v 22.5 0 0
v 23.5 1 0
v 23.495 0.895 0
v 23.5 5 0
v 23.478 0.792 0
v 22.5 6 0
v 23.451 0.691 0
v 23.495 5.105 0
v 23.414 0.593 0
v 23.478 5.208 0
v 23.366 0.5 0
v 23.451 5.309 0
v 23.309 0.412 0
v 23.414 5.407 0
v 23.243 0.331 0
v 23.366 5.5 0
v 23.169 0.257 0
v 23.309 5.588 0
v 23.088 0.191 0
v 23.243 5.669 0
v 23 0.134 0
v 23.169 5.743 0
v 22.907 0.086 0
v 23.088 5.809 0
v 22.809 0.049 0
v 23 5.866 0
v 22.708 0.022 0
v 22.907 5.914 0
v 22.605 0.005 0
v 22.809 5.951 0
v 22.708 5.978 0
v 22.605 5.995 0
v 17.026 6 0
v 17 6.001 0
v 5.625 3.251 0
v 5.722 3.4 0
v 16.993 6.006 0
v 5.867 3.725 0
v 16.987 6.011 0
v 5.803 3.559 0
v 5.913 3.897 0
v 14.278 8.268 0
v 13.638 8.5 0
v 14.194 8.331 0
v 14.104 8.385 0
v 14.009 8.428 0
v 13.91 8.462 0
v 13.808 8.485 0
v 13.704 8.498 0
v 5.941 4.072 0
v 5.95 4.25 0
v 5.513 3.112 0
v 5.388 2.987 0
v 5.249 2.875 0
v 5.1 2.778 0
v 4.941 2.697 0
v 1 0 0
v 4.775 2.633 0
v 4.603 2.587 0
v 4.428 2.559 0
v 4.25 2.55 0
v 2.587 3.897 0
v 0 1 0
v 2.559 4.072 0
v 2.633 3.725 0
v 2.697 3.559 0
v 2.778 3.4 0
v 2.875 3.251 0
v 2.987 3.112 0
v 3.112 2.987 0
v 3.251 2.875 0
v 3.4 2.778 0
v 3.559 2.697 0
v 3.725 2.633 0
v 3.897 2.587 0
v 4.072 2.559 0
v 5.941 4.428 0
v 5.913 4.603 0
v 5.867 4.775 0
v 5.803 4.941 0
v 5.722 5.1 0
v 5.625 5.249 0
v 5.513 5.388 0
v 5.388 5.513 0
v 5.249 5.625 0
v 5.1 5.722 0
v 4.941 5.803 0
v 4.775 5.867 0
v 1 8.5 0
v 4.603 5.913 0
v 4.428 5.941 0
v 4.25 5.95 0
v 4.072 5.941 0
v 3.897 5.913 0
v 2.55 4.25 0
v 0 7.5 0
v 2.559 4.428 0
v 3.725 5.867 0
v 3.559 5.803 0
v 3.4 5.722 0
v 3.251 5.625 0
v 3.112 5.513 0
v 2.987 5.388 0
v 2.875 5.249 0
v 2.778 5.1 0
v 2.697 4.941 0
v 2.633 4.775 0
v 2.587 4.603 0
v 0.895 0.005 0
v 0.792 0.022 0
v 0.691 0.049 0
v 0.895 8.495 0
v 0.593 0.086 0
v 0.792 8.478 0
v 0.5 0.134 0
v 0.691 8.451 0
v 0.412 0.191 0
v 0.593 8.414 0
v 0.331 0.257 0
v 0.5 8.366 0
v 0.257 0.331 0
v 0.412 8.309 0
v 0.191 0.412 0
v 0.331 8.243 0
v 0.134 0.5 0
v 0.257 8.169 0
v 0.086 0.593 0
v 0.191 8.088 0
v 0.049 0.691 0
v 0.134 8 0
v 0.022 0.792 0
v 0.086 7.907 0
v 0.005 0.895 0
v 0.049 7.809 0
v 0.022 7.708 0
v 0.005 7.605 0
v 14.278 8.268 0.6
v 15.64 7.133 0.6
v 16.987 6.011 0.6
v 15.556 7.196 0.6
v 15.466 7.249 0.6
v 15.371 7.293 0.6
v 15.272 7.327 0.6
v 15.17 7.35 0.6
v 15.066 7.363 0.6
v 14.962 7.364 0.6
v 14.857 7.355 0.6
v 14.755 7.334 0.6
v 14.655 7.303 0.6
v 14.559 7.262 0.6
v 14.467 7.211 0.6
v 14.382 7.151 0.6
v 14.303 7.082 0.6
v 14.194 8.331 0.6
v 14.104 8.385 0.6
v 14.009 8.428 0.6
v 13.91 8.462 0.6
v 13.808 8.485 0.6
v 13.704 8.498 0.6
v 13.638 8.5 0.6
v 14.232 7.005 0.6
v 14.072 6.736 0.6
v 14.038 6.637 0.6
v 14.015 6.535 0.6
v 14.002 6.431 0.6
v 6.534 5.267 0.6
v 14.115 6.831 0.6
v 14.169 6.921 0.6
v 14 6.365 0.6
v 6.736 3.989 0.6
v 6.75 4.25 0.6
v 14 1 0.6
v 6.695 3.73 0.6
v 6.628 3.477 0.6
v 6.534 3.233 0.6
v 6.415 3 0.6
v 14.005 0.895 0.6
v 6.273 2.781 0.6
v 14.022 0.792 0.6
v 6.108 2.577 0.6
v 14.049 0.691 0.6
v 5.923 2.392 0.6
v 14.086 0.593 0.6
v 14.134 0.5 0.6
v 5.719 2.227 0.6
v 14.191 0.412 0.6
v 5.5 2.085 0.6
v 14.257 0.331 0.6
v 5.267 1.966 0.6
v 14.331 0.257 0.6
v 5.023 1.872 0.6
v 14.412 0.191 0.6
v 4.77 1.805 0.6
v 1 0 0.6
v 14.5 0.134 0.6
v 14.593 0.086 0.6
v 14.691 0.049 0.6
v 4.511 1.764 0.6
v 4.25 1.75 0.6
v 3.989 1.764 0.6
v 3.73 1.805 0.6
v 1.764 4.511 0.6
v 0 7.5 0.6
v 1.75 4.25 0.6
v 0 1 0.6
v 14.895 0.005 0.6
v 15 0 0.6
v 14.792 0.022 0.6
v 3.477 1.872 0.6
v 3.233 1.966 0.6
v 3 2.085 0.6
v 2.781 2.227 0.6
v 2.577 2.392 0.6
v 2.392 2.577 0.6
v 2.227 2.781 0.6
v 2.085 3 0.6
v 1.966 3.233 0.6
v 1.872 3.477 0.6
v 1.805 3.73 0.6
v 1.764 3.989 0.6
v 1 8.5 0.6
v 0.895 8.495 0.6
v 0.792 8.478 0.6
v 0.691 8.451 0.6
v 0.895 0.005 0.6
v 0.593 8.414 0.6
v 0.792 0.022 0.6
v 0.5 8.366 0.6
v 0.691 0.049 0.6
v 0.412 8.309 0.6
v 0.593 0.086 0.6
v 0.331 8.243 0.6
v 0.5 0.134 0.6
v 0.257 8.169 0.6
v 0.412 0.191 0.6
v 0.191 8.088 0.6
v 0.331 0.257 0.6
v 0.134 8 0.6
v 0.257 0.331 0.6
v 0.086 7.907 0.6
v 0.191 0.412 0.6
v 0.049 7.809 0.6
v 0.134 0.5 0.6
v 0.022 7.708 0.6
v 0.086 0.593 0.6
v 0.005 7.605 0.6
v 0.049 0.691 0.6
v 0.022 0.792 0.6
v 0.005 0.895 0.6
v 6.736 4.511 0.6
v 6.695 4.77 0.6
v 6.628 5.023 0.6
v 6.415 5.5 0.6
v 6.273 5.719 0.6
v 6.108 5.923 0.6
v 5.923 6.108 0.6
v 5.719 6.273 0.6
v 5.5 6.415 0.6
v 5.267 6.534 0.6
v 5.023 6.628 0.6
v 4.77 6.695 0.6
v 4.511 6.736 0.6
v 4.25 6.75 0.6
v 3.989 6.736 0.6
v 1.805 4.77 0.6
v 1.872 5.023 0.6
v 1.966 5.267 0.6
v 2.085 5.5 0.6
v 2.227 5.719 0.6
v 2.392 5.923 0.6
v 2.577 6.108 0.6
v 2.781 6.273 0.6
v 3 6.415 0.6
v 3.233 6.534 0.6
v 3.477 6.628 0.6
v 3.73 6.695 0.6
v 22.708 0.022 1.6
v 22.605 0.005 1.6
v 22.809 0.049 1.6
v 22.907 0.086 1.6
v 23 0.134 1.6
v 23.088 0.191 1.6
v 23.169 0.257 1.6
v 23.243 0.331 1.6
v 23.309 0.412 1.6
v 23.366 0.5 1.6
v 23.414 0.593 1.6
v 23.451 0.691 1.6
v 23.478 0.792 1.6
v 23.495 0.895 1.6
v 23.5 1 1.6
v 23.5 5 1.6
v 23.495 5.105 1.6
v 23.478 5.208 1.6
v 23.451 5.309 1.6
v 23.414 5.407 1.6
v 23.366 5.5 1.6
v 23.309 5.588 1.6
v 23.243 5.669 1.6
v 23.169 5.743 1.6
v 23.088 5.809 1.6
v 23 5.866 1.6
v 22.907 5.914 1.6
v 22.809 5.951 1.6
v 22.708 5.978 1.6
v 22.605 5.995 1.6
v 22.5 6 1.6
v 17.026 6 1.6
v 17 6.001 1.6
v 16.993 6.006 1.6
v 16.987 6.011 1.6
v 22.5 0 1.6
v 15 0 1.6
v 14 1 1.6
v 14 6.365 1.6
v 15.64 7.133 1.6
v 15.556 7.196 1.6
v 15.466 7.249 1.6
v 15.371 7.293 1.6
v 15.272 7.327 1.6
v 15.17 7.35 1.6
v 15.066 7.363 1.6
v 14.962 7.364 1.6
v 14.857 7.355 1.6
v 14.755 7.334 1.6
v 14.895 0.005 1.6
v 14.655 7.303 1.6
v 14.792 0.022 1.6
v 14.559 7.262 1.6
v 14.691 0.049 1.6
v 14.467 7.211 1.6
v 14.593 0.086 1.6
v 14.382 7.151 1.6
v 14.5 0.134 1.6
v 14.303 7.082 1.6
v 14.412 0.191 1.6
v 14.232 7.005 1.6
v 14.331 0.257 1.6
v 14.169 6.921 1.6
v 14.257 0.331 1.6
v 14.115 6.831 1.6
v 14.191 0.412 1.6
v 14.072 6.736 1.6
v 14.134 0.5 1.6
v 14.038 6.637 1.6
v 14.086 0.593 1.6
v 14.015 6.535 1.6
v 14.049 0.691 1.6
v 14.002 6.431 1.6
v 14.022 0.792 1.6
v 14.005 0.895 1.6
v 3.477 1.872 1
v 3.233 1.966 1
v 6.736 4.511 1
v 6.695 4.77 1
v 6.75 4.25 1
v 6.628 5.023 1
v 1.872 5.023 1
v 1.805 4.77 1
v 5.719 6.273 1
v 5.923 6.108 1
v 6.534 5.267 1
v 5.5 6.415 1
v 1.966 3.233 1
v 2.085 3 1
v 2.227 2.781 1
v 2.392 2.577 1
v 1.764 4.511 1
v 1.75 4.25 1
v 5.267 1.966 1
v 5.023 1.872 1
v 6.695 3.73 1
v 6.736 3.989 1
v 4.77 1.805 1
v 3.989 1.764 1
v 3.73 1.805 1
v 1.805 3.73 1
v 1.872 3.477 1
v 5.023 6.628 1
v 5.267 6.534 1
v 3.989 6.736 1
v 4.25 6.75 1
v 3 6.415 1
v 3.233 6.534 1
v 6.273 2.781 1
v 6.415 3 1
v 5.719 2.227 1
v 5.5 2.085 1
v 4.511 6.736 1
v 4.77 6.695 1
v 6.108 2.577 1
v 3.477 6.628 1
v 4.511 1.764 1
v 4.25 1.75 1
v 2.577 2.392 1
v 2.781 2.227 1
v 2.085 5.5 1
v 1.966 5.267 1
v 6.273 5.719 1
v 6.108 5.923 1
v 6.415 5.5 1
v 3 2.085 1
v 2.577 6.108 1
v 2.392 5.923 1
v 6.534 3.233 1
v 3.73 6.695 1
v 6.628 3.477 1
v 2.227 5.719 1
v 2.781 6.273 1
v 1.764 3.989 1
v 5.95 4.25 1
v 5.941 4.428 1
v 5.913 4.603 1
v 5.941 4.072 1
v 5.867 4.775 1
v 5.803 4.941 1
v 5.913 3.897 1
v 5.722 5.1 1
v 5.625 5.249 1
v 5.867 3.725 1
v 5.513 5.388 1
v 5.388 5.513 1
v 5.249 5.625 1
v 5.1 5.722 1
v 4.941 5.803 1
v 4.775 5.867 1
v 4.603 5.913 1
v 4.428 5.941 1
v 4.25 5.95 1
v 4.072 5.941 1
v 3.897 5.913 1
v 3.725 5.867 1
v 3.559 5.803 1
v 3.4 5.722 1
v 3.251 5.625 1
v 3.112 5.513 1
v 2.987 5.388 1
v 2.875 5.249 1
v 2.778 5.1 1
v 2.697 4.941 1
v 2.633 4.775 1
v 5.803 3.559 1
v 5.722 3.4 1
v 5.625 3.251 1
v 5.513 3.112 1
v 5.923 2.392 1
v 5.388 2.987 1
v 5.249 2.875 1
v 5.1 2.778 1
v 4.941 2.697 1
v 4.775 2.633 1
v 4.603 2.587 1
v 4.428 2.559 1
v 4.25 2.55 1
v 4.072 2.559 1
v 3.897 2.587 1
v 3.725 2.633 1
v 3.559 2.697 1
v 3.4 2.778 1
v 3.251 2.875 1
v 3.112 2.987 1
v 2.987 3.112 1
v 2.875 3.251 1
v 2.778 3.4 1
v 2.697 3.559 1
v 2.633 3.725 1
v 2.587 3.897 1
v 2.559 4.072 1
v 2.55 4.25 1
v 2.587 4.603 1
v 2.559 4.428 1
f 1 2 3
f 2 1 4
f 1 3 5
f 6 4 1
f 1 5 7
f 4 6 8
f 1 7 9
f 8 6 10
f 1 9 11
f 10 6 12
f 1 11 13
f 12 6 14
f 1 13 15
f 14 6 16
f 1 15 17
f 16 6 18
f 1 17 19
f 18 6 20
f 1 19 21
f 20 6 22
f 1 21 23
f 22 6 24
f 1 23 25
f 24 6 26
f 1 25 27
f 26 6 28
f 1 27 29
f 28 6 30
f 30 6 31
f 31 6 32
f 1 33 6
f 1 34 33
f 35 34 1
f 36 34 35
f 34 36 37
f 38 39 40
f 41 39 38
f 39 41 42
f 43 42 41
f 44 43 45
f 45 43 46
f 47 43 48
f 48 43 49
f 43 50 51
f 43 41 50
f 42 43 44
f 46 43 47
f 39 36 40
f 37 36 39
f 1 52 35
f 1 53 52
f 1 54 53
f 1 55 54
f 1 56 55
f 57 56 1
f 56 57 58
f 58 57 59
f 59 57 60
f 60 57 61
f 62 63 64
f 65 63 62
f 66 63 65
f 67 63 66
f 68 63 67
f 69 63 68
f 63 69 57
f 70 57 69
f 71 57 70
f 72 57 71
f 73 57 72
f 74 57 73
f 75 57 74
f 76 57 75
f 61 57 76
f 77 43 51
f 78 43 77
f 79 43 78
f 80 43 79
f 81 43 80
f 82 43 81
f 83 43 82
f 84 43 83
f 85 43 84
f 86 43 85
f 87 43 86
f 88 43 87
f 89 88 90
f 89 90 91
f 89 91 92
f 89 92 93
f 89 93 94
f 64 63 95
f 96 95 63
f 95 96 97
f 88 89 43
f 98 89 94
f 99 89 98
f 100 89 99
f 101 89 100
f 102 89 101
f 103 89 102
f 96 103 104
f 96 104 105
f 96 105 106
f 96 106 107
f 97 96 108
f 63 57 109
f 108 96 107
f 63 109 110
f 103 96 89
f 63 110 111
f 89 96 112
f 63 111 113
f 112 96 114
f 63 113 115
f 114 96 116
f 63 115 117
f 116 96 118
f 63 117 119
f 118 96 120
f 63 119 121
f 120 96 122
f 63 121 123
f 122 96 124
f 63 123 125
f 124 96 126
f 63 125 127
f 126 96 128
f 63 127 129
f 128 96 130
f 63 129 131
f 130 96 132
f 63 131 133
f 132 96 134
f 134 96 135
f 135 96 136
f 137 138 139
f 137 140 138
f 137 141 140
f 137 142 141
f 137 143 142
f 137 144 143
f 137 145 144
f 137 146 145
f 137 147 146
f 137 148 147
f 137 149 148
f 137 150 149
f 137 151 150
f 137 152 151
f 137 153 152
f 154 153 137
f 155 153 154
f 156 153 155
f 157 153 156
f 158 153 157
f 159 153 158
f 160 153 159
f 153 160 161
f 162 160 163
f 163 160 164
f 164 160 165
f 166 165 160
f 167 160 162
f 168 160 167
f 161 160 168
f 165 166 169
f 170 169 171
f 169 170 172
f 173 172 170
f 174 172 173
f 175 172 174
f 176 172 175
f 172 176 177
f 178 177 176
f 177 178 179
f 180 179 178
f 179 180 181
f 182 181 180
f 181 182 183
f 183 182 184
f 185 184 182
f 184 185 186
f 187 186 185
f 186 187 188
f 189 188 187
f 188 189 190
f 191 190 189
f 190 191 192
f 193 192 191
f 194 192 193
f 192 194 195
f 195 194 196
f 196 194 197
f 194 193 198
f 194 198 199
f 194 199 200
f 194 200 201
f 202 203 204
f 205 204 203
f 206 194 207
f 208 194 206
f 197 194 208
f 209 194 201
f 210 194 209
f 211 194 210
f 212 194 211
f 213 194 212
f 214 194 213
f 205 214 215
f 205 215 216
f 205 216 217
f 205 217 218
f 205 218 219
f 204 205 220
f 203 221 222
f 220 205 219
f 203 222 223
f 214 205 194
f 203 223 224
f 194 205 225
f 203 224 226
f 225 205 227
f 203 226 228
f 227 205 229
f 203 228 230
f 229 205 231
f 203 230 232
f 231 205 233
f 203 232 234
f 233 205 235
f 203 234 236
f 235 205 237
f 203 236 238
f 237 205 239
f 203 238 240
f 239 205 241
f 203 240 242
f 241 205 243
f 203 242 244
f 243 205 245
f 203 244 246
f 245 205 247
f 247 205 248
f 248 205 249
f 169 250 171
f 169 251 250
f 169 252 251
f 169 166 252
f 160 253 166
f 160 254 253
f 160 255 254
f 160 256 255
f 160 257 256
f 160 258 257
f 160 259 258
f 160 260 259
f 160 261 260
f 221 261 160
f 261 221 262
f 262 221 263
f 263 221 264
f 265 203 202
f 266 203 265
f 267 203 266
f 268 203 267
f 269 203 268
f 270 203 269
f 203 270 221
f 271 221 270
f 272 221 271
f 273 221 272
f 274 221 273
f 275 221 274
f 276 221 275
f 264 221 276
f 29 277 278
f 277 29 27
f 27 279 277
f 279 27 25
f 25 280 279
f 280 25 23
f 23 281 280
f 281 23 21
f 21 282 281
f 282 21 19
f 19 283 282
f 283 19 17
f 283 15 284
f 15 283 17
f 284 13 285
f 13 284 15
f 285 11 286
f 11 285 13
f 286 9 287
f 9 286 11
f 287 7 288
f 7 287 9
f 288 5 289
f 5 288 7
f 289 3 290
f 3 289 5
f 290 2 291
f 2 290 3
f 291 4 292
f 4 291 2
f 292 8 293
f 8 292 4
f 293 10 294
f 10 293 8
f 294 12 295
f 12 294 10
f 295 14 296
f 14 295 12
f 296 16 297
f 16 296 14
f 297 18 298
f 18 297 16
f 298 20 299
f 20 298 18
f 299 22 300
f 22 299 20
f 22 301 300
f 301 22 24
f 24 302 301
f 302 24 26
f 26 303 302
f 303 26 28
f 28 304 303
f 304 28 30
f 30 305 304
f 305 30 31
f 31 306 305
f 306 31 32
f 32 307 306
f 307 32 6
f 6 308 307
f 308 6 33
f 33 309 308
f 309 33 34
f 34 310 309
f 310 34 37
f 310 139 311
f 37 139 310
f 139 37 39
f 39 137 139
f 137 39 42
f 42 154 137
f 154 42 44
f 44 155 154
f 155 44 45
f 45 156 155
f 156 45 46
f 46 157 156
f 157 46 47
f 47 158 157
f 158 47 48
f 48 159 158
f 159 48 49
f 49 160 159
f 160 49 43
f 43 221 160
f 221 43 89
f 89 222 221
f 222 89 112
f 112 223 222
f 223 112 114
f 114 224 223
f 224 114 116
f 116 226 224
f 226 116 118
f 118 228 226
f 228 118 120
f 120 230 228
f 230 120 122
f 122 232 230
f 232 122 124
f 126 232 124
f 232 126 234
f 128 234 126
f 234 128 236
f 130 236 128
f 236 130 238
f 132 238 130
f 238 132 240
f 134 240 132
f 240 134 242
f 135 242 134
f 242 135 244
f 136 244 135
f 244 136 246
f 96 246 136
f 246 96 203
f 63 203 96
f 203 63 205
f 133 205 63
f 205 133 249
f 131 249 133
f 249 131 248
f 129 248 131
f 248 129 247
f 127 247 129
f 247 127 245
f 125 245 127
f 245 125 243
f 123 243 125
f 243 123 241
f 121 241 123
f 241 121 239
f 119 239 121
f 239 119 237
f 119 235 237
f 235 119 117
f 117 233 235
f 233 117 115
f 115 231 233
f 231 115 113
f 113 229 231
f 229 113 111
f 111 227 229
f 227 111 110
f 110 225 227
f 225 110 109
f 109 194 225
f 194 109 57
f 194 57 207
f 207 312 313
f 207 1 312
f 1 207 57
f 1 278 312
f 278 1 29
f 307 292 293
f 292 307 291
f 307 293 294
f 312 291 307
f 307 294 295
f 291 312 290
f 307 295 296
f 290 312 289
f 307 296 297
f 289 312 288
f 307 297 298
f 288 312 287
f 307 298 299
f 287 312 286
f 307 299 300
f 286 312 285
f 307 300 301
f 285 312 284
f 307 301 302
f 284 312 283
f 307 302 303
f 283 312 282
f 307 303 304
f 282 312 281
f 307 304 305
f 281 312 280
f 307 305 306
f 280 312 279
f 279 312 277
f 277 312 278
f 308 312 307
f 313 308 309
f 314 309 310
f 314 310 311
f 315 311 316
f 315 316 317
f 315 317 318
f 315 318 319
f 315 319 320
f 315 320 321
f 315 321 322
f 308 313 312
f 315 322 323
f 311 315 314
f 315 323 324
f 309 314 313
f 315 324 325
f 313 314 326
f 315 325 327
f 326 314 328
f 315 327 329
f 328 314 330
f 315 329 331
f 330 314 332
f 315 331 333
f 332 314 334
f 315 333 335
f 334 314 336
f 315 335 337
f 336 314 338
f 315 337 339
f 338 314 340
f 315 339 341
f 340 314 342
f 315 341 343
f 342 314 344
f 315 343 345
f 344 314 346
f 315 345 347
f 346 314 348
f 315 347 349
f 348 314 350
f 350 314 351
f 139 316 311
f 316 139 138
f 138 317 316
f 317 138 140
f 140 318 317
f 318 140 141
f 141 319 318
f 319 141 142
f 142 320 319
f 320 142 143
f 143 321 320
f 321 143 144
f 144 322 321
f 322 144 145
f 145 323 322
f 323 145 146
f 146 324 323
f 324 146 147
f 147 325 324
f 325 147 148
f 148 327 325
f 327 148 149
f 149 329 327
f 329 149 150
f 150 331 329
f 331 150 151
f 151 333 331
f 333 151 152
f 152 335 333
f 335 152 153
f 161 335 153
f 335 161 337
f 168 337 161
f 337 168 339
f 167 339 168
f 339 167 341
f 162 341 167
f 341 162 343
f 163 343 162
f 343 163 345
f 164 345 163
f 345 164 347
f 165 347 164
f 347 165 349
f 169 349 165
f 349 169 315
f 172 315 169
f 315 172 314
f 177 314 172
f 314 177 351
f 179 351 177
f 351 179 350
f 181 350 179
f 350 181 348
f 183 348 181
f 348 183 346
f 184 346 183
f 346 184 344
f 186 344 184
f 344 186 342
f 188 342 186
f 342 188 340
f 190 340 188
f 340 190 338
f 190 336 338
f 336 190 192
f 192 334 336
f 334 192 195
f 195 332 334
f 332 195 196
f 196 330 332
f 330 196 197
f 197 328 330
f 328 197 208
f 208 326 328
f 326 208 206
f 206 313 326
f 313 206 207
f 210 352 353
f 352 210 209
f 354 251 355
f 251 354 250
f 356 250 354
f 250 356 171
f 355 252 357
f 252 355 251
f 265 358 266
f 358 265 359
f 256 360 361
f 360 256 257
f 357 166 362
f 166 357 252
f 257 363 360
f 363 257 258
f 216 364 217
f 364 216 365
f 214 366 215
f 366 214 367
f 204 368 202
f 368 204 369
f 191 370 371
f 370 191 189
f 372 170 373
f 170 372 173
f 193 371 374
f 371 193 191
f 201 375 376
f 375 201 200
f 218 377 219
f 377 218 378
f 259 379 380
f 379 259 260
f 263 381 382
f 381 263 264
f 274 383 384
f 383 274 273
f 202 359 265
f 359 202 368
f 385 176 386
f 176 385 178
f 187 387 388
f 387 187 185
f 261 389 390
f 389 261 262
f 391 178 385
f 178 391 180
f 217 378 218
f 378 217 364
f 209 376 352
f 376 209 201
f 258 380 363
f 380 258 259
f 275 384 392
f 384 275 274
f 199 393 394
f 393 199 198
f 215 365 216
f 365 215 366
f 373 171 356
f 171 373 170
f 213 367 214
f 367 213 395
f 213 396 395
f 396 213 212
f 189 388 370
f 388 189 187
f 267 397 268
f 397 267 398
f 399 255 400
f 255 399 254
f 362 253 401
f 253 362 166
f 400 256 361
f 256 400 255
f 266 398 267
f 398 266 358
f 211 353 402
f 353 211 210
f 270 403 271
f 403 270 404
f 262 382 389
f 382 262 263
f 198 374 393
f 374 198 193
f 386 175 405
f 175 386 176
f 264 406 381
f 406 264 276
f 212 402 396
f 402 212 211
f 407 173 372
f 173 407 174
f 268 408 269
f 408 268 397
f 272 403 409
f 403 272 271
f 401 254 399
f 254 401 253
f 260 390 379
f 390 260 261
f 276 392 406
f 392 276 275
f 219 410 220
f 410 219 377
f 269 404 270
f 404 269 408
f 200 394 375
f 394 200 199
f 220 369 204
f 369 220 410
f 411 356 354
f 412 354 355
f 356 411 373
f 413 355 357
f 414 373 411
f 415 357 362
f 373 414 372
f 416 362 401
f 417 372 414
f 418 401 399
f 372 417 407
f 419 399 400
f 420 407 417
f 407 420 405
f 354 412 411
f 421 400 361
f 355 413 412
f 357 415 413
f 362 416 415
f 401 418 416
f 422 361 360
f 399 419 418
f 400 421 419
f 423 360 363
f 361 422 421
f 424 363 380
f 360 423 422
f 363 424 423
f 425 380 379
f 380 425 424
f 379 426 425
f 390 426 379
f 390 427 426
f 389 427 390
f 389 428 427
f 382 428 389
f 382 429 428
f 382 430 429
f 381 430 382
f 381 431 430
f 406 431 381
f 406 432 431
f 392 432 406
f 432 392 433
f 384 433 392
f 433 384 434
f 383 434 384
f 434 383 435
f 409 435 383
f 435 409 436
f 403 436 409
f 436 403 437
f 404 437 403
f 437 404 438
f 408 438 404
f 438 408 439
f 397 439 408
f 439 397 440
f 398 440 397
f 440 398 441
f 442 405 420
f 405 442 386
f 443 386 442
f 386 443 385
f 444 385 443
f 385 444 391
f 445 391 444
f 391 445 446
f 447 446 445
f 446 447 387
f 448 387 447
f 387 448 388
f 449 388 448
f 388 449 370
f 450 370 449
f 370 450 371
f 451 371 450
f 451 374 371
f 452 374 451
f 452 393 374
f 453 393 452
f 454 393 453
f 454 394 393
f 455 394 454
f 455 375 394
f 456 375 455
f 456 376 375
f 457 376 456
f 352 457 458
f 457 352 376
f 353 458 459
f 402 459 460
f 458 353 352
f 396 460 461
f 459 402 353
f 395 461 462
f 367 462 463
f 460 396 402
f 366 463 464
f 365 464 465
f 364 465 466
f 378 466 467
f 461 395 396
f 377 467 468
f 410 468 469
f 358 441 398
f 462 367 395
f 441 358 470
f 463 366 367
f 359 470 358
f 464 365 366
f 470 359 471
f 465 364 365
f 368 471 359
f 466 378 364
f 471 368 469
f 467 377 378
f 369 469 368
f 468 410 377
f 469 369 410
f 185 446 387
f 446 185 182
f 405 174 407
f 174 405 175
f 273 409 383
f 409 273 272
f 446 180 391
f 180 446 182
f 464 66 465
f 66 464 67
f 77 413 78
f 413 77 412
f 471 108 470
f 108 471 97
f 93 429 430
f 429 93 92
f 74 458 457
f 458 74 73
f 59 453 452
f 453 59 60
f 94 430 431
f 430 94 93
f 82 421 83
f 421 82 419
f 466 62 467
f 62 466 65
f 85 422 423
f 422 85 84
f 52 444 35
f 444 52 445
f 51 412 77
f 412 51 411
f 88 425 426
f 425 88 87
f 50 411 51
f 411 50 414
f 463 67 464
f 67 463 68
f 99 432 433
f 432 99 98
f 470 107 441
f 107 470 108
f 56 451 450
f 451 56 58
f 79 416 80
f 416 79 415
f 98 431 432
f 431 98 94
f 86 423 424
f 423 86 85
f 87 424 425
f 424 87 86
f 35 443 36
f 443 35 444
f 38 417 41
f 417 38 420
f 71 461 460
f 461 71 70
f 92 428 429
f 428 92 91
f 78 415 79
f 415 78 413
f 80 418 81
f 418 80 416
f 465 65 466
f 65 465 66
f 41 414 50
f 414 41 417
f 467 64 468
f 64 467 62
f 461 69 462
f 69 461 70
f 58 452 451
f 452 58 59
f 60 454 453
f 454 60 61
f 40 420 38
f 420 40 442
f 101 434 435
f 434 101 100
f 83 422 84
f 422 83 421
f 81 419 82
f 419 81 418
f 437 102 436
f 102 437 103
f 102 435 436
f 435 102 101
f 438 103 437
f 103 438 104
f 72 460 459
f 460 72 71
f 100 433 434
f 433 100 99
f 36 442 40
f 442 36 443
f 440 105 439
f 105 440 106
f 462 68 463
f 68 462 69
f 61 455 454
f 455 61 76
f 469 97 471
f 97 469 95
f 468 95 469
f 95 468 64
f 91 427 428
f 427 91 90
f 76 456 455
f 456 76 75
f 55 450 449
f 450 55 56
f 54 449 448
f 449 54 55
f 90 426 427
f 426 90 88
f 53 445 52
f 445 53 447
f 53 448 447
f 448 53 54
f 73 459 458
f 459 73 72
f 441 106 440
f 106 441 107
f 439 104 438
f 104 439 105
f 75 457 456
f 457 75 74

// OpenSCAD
$fn=60;
difference() {
   union() {
      linear_extrude(0.6) offset(r=1) offset(r=-1) polygon([[0,0],[23.5,0],[23.5,6],[17,6],[14,8.5],[0,8.5]]);
      linear_extrude(1.6) offset(r=1) offset(r=-1) polygon([[14,0],[23.5,0],[23.5,6],[17,6],[14,8.5]]);
      translate([4.25,4.25,0.6]) cylinder(d=5,h=0.4,center=false);
   }
   translate([4.25,4.25,-0.1]) cylinder(d=3.4,h=3,center=false);
}
